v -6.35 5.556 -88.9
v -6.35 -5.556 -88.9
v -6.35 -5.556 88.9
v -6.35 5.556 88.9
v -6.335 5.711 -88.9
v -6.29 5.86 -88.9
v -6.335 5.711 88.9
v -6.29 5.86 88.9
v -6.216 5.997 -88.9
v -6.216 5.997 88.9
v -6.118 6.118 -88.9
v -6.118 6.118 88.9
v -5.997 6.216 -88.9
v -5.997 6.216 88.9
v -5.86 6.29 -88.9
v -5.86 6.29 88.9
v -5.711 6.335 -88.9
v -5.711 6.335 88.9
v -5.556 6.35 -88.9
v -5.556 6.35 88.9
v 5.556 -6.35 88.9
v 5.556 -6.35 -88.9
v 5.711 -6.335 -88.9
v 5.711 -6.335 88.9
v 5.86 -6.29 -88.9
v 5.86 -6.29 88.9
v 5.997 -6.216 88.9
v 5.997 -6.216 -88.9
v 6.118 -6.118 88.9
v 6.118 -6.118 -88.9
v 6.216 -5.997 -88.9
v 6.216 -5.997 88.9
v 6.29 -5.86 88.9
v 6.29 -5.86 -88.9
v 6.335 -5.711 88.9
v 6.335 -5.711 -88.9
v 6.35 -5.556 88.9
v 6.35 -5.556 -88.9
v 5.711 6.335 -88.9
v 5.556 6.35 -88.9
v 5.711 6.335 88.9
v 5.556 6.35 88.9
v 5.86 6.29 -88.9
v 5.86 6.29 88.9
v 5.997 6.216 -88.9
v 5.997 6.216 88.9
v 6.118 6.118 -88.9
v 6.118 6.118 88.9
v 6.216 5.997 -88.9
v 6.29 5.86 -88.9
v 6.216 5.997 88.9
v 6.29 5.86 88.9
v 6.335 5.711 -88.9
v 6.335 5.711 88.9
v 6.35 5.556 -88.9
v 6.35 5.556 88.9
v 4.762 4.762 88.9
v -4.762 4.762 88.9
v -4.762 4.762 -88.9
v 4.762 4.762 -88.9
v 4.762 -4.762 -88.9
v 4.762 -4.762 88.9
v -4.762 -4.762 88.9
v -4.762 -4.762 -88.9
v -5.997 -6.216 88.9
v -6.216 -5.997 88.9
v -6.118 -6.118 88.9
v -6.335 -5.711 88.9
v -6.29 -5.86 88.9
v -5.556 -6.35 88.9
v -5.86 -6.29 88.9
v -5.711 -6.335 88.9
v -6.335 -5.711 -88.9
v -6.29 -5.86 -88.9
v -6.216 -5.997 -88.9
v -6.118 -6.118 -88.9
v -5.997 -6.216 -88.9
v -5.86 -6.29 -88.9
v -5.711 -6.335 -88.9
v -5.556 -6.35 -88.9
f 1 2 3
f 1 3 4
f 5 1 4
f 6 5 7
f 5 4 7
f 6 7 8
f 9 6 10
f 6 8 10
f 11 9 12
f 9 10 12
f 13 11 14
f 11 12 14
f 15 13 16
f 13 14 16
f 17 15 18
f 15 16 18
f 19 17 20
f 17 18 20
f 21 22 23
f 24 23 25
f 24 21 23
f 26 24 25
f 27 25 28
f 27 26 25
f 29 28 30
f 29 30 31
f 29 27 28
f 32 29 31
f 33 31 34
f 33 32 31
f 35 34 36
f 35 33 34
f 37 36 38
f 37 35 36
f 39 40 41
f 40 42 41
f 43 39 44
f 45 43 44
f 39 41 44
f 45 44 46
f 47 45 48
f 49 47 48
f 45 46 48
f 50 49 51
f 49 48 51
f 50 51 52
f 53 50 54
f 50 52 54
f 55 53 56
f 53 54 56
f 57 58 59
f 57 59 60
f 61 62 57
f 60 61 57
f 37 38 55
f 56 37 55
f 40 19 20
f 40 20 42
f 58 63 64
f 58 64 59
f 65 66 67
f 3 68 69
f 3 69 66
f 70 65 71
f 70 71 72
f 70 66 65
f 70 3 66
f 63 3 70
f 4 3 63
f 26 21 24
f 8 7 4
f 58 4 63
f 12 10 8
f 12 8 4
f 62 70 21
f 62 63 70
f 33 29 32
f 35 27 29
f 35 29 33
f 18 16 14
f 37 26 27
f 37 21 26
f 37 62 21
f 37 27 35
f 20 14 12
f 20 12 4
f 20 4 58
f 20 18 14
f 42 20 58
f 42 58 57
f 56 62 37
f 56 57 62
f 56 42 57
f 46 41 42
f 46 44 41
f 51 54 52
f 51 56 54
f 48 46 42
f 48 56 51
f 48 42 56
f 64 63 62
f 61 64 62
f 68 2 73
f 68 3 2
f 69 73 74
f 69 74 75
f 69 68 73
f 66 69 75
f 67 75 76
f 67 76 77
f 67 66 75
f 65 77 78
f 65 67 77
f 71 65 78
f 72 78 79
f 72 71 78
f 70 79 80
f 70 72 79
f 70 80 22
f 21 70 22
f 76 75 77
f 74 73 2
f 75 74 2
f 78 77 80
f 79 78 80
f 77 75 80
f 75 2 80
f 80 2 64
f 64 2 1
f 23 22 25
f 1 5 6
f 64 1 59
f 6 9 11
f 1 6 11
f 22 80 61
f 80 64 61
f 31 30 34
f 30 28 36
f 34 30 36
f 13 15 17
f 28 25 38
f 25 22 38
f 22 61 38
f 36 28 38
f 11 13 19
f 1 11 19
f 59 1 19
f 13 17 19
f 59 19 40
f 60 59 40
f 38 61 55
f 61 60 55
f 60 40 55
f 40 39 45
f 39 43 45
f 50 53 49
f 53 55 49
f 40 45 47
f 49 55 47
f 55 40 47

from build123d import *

# Parameters (mm, degrees)
BOSS_EXTRUDE1_DEPTH      = 88.9
BOSS_EXTRUDE1_DEPTH_BACK = 88.9
SKETCH1_W                = 12.7
SKETCH1_H                = 12.7
SKETCH1_W_2              = 9.525
SKETCH1_H_2              = 9.525
FILLET1_R                = 0.79375


with BuildPart() as part:
    # Sketch1 → Boss-Extrude1 (new, two sides: drawn at the far end of the back side and taken through both)
    with BuildSketch(Plane.XY.offset(-BOSS_EXTRUDE1_DEPTH_BACK)):
        Rectangle(SKETCH1_W, SKETCH1_H)
        Rectangle(SKETCH1_W_2, SKETCH1_H_2, mode=Mode.SUBTRACT)
    extrude(amount=BOSS_EXTRUDE1_DEPTH + BOSS_EXTRUDE1_DEPTH_BACK)

    # Fillet1
    fillet1_edges = [part.edges().sort_by_distance(p)[0] for p in [
        (6.35, -6.35, 0),
        (-6.35, -6.35, 0),
        (-6.35, 6.35, 0),
        (6.35, 6.35, 0),
    ]]
    fillet(fillet1_edges, radius=FILLET1_R)


solid = part.part
